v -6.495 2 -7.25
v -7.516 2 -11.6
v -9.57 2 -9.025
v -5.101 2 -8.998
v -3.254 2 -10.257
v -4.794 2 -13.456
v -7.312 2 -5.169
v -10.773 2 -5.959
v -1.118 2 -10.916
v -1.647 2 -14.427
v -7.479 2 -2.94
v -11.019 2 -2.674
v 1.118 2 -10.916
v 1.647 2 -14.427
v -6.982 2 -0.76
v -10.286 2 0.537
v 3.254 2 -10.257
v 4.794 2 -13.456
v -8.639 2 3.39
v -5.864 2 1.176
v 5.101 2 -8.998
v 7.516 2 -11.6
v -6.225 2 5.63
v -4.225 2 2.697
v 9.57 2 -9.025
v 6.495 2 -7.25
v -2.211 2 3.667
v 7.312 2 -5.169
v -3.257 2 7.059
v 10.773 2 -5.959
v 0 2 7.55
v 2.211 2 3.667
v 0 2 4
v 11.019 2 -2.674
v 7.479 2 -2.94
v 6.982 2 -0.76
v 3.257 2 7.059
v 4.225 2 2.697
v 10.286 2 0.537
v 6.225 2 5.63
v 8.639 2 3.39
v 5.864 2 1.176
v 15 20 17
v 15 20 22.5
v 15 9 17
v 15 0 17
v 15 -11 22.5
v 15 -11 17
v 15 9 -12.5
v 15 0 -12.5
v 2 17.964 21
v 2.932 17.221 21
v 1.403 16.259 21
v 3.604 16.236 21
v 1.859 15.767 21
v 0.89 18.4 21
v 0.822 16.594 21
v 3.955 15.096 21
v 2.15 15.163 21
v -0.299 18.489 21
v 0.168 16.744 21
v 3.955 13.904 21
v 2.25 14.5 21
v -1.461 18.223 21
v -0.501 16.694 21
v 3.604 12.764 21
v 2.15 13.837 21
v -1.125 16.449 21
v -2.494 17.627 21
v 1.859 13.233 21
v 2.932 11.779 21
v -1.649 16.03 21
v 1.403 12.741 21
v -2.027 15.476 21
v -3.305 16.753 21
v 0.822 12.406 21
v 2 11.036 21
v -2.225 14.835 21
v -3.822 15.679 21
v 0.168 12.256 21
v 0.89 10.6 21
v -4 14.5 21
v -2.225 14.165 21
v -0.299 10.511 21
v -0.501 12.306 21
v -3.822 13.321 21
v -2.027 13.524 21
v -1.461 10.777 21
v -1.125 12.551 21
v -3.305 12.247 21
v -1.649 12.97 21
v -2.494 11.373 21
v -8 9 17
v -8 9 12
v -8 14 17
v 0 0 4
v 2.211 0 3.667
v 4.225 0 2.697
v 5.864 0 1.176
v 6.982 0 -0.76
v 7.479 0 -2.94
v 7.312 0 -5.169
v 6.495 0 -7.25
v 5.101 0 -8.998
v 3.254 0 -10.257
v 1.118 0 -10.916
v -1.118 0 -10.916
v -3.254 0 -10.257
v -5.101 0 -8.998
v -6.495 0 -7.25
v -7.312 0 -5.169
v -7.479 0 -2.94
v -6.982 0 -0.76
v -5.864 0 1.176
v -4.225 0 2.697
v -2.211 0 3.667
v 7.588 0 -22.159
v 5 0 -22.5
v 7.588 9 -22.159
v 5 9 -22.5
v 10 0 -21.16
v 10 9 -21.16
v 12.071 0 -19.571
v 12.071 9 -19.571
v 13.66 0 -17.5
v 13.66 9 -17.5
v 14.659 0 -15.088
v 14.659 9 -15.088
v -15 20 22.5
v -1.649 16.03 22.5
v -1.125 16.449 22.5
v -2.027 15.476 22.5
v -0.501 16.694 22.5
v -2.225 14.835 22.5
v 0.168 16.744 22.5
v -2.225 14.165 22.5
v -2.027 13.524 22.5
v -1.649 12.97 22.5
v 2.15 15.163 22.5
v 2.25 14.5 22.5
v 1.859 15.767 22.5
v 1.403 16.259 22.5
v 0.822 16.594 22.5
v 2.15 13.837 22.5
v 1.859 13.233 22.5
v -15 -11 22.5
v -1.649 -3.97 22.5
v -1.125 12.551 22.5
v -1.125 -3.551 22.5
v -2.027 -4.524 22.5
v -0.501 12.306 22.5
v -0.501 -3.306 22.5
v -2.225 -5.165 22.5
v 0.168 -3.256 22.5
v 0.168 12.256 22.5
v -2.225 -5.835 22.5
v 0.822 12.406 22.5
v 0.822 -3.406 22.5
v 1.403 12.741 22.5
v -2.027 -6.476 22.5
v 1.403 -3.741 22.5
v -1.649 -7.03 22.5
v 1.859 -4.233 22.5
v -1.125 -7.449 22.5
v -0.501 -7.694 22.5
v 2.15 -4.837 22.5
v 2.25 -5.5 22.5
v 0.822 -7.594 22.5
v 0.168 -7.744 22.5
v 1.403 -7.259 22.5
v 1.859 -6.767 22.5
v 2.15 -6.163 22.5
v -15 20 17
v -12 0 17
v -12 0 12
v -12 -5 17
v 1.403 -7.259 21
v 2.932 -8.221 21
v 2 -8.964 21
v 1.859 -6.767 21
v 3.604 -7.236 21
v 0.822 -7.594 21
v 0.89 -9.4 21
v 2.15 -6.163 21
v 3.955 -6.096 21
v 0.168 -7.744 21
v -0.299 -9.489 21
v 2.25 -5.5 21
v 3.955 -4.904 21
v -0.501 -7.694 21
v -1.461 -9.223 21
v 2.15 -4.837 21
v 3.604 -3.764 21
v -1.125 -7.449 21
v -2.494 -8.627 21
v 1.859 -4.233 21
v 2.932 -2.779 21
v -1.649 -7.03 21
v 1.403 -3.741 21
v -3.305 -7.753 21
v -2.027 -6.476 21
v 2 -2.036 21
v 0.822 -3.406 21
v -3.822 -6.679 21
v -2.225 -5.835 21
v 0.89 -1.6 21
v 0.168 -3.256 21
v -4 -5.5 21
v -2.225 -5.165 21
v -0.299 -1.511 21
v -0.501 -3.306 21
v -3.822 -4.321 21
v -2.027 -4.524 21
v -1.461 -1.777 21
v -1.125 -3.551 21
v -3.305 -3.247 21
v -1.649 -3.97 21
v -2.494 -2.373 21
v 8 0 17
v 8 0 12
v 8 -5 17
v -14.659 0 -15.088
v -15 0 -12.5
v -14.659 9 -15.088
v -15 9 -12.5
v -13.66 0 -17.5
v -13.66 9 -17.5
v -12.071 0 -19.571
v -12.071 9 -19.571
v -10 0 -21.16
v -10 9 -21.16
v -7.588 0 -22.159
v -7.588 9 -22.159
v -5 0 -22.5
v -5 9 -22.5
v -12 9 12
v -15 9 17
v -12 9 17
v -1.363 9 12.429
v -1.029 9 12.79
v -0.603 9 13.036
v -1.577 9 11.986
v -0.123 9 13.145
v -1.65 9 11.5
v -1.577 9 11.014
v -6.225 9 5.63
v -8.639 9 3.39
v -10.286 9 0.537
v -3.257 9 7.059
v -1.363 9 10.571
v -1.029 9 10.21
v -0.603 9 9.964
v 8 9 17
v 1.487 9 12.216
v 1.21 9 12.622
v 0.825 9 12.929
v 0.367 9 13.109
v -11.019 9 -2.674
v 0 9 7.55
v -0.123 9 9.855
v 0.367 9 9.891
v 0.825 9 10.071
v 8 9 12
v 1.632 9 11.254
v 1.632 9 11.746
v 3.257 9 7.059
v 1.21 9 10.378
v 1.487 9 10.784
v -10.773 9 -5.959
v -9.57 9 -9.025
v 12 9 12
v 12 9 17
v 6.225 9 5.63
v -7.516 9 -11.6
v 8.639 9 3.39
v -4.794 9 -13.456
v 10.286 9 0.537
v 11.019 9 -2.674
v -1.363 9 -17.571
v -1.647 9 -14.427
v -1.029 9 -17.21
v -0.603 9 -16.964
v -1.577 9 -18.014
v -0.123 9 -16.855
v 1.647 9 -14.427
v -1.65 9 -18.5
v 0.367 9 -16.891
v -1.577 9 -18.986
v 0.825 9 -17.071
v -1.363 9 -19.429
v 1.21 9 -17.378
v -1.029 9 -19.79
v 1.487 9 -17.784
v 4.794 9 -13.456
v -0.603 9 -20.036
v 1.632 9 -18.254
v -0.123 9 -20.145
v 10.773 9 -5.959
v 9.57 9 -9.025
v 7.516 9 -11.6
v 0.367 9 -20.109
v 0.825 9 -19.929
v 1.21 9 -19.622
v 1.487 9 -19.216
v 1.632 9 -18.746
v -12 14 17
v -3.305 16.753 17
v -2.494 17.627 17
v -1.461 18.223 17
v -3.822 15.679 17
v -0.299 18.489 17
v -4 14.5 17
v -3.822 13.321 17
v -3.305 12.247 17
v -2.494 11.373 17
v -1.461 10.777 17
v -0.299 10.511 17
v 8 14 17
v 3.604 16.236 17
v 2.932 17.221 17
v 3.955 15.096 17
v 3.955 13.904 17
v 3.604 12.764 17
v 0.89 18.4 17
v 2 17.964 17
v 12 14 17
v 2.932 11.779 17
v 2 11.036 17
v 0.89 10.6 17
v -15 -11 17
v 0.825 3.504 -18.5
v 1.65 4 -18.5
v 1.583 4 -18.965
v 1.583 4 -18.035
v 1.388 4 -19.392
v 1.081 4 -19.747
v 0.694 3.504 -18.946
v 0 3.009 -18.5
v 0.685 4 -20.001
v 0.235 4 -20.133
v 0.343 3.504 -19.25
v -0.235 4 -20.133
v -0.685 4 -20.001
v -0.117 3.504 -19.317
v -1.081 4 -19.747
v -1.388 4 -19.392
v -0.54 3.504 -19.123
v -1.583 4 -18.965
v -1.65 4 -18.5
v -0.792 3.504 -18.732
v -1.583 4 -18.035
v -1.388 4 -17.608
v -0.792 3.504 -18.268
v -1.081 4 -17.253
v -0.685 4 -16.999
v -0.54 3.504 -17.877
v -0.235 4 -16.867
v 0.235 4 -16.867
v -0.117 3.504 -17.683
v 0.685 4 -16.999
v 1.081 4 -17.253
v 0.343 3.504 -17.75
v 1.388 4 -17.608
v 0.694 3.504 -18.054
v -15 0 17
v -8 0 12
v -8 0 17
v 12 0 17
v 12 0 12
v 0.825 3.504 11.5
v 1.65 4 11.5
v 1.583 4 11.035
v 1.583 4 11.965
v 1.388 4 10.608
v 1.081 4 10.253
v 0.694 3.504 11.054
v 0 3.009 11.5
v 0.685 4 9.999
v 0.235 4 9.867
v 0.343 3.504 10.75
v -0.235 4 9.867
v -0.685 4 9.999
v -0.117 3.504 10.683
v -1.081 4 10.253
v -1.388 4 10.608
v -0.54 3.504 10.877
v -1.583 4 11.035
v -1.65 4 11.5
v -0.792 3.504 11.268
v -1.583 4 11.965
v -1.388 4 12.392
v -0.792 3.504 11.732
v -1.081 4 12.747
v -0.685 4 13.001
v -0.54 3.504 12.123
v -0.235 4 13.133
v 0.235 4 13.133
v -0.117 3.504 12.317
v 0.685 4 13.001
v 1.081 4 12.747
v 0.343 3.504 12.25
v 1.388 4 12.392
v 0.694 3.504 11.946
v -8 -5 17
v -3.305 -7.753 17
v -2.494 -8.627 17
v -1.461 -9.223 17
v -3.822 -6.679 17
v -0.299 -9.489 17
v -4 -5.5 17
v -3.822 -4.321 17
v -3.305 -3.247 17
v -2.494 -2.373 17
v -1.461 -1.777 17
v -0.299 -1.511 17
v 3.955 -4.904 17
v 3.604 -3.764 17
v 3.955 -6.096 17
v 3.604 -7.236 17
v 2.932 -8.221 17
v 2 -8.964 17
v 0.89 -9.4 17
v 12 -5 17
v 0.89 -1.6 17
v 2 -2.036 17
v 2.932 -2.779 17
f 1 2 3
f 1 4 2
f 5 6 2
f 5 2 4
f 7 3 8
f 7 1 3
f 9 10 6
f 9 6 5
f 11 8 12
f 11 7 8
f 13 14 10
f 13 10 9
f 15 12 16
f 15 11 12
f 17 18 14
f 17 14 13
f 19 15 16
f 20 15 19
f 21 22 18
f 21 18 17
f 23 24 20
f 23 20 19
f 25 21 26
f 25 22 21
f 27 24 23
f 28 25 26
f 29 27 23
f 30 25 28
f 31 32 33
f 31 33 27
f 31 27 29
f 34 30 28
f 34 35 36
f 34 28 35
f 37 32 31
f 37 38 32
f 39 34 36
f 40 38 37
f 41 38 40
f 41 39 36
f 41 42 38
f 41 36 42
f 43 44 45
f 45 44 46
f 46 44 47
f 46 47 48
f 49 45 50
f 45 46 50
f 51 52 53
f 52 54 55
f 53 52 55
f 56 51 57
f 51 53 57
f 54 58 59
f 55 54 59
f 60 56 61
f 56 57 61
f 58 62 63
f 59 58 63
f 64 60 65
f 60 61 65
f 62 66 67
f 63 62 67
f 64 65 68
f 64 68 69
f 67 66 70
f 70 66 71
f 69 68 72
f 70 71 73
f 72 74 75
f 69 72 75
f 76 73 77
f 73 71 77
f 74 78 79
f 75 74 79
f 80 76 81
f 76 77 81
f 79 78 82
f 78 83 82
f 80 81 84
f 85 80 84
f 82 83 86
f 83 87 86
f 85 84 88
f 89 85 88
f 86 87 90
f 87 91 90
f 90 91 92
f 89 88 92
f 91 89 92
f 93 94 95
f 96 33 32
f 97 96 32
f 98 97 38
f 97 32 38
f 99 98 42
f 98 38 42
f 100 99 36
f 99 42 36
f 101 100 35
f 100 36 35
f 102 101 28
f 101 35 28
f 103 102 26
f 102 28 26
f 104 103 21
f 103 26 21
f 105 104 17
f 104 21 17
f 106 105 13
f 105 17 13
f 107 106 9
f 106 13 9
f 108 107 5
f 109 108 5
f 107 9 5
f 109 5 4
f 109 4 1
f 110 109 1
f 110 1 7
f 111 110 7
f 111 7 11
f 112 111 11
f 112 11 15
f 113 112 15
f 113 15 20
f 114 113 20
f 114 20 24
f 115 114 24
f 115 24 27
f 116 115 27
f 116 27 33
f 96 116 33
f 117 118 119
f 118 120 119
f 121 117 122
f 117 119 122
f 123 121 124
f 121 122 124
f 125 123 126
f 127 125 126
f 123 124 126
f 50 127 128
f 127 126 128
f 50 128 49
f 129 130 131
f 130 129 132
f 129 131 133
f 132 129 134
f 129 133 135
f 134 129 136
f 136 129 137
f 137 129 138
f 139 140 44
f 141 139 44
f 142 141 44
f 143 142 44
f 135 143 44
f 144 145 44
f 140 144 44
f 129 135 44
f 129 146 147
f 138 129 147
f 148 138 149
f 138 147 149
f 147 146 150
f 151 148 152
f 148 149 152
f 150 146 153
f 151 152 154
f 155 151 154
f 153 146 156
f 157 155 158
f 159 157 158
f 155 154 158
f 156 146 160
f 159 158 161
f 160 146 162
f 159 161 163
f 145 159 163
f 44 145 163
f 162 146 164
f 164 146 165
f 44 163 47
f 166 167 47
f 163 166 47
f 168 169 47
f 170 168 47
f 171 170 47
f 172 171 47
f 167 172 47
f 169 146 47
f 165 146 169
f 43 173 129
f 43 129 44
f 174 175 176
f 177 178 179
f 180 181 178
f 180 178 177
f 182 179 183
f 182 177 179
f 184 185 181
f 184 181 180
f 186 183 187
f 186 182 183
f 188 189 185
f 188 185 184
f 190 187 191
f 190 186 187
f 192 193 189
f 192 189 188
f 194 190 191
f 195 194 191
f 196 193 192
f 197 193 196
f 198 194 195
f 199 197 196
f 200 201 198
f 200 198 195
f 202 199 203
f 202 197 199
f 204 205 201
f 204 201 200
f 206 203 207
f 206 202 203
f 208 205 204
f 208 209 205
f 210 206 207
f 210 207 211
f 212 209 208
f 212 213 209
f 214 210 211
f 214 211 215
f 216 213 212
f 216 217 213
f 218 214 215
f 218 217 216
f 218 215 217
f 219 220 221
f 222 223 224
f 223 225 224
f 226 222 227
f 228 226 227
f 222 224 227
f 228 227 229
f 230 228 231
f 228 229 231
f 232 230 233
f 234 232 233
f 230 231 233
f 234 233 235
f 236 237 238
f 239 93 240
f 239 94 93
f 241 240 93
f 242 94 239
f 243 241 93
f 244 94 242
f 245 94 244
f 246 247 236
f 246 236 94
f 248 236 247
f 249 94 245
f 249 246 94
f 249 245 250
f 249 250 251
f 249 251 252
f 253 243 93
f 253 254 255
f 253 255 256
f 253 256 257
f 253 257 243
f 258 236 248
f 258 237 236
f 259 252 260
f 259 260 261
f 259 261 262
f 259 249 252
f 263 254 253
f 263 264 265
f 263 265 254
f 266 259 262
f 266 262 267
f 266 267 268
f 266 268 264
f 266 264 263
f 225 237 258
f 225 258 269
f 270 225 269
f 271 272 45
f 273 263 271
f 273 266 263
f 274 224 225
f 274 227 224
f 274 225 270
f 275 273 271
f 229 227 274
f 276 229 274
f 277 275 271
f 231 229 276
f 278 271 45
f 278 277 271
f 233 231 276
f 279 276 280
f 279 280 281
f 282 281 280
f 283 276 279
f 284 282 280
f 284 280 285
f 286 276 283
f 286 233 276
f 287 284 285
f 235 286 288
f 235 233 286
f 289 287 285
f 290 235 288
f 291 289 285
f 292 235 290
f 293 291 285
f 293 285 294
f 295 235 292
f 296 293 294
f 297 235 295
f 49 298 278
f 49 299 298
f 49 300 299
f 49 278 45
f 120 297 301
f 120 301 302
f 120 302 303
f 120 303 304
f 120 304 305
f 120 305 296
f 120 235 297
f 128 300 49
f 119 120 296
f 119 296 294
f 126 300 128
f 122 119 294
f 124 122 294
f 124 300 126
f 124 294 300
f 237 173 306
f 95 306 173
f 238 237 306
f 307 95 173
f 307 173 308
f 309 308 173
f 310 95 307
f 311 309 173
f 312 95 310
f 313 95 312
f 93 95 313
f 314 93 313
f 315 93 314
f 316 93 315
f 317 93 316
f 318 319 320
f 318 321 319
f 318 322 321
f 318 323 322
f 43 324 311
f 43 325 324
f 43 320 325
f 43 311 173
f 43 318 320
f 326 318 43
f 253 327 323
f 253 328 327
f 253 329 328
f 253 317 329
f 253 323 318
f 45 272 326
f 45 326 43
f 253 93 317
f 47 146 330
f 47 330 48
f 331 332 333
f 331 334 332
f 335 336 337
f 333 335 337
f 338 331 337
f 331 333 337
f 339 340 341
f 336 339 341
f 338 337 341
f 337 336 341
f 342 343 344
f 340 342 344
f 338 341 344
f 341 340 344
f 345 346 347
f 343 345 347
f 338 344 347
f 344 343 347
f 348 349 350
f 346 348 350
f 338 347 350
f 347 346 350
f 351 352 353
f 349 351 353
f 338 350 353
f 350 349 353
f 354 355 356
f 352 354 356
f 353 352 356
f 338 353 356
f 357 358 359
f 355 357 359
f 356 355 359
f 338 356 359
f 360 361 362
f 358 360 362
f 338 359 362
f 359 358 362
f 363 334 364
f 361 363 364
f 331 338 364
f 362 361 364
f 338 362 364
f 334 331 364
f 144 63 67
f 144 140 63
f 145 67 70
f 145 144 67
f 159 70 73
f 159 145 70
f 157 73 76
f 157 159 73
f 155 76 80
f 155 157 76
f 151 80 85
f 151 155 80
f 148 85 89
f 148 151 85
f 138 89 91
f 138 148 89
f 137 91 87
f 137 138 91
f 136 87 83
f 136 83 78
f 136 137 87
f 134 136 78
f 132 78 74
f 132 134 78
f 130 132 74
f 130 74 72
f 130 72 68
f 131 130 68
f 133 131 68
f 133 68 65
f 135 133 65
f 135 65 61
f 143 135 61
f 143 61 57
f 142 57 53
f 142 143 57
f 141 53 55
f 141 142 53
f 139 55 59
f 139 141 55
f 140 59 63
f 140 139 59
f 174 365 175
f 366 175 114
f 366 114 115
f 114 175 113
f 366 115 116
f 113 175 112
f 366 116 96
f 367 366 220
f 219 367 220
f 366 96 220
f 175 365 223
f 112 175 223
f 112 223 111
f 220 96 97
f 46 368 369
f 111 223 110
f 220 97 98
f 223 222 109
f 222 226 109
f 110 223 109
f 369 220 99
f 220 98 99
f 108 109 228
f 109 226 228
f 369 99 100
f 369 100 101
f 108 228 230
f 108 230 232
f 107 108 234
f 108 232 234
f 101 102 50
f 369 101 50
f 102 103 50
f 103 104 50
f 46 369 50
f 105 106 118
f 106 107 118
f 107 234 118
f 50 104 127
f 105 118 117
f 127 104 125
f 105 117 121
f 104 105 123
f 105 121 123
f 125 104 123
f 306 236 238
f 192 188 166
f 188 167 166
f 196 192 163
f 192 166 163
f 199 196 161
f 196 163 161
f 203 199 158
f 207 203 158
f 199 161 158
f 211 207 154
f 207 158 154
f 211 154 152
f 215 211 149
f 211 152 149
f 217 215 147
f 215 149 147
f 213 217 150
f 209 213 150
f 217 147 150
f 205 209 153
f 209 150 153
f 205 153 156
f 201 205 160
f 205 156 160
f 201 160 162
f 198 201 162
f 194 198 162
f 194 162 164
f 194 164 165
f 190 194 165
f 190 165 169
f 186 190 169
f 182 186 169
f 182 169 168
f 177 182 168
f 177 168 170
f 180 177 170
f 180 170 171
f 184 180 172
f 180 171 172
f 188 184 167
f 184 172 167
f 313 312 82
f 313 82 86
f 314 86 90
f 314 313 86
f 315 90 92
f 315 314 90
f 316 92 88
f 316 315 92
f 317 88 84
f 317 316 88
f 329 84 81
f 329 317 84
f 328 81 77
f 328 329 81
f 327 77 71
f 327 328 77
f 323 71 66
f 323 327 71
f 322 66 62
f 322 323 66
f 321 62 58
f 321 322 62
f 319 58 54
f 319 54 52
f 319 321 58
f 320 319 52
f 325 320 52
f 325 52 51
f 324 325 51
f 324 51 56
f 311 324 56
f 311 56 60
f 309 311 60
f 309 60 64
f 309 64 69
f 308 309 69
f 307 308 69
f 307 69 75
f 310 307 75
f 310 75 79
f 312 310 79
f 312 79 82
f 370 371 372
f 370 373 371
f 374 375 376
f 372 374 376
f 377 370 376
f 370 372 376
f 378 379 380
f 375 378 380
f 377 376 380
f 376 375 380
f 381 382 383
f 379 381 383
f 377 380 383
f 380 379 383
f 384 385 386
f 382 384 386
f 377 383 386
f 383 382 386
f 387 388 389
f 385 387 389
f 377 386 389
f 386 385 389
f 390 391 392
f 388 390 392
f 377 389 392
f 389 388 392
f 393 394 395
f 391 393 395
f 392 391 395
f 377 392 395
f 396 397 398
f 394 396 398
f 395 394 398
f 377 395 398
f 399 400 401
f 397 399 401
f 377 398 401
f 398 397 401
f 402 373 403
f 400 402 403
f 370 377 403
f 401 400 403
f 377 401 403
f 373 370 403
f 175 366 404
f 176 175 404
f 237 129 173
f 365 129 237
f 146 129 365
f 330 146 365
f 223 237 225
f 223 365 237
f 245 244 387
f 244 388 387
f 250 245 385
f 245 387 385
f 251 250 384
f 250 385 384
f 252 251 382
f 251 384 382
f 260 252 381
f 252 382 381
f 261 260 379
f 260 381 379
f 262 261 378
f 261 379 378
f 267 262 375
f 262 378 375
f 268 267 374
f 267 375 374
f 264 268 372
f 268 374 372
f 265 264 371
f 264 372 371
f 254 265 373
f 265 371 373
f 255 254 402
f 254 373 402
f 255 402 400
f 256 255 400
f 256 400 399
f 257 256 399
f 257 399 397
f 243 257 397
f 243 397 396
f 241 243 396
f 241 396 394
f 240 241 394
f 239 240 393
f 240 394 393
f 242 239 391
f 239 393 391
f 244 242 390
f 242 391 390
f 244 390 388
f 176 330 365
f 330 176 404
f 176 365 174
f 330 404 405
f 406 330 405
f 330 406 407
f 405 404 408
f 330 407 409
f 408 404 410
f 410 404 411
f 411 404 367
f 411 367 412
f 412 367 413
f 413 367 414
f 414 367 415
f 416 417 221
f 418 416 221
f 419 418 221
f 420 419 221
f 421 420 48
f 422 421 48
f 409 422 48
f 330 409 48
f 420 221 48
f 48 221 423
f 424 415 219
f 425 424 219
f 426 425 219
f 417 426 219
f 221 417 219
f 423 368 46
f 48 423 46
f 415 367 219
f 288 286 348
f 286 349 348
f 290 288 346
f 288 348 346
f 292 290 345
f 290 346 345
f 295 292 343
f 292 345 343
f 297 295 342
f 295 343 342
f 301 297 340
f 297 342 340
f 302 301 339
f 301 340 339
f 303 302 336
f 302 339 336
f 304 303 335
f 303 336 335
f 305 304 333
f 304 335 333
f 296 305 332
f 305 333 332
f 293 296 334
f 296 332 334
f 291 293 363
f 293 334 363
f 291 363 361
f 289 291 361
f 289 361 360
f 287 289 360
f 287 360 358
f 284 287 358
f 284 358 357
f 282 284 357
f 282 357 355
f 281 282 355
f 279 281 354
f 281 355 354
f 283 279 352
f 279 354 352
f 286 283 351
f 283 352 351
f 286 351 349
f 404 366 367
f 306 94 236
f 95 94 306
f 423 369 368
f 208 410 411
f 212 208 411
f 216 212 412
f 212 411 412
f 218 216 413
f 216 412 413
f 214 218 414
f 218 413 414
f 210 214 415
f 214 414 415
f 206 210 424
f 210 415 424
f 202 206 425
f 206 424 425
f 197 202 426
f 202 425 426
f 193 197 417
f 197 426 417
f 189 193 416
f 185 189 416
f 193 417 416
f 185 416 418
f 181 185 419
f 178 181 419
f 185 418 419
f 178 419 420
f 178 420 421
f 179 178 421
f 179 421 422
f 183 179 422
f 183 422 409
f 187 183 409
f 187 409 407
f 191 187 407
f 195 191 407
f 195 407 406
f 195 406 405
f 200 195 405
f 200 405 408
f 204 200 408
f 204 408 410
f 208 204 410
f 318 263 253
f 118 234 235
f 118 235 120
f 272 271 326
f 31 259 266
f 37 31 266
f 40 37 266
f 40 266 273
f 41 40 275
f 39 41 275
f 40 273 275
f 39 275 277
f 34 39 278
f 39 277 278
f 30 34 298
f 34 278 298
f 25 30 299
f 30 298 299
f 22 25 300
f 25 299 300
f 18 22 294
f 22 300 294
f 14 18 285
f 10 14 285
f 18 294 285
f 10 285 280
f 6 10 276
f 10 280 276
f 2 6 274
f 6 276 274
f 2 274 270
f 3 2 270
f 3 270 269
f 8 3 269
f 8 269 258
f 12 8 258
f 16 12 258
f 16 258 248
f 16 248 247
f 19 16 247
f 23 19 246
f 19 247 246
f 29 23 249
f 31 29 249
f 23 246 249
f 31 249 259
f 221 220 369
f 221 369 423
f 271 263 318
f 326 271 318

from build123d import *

# Parameters (mm, degrees)
SKETCH2_W                      = 30
SKETCH2_H                      = 45
BOSS_EXTRUDE1_DEPTH            = 9
SKETCH3_R                      = 11.05
CUT_EXTRUDE1_DEPTH             = 7
SKETCH4_R                      = 7.5
CUT_EXTRUDE2_DEPTH             = 28.932955447
FILLET1_R                      = 10
SKETCH5_W                      = 30
SKETCH5_H                      = 11
BOSS_EXTRUDE2_DEPTH            = 5.5
CBORE_FOR_M4_SHCS1_D           = 4.5
CBORE_FOR_M4_SHCS1_CBORE_D     = 8
CBORE_FOR_M4_SHCS1_CBORE_DEPTH = 4
RIB1_REACH                     = 37.387
SKETCH10_WALL_W                = 79.845356928
SKETCH10_WALL_H                = 4
F_3_3_3_3_DIAMETER_HOLE1_D     = 3.3
F_3_3_3_3_DIAMETER_HOLE1_DEPTH = 5
F_3_3_3_3_DIAMETER_HOLE1_TIP   = 0.991420021
SKETCH14_W                     = 30
SKETCH14_H                     = 5.5
BOSS_EXTRUDE3_DEPTH            = 11
MIRROR2_COPY_1_REACH           = 37.387
MIRROR2_COPY_1_SKETCH_W        = 79.845356928
MIRROR2_COPY_1_SKETCH_H        = 4


with BuildPart() as part:
    # Sketch2 → Boss-Extrude1 (new body)
    with BuildSketch(Plane(origin=(0, 0, 0), x_dir=(1, 0, 0), z_dir=(0, 1, 0))):
        Rectangle(SKETCH2_W, SKETCH2_H)
    extrude(amount=BOSS_EXTRUDE1_DEPTH)

    # Sketch3 → Cut-Extrude1 (cut)
    with BuildSketch(Plane(origin=(0, 9, 0), x_dir=(1, 0, 0), z_dir=(0, 1, 0))):
        with Locations(Location((0, 3.5, 0), (0, 0, 270))):
            Circle(SKETCH3_R)
    extrude(amount=-CUT_EXTRUDE1_DEPTH, mode=Mode.SUBTRACT)

    # Sketch4 → Cut-Extrude2 (cut, through all)
    with BuildSketch(Plane(origin=(0, 2, 0), x_dir=(1, 0, 0), z_dir=(0, 1, 0))):
        with Locations(Location((0, 3.5, 0), (0, 0, 270))):
            Circle(SKETCH4_R)
    extrude(amount=-CUT_EXTRUDE2_DEPTH, mode=Mode.SUBTRACT)

    # Fillet1
    fillet1_edges = [part.edges().sort_by_distance(p)[0] for p in [
        (-15, 4.5, -22.5),
        (15, 4.5, -22.5),
    ]]
    fillet(fillet1_edges, radius=FILLET1_R)

    # Sketch5 → Boss-Extrude2 (add)
    with BuildSketch(Plane.XY.offset(22.5)):
        with Locations((0, -5.5)):
            Rectangle(SKETCH5_W, SKETCH5_H)
    extrude(amount=-BOSS_EXTRUDE2_DEPTH)

    # CBORE for M4 SHCS1 (through all)
    with Locations(Plane(origin=(0, 0, 17), x_dir=(-1, 0, 0), z_dir=(0, 0, -1))):
        with Locations((0, -5.5)):
            cbore_for_m4_shcs1 = CounterBoreHole(CBORE_FOR_M4_SHCS1_D / 2, CBORE_FOR_M4_SHCS1_CBORE_D / 2, CBORE_FOR_M4_SHCS1_CBORE_DEPTH)

    # Sketch10 wall → Rib1 (add, up to next)
    with BuildSketch(Plane(origin=(-10, -2.5, 14.5), x_dir=(0, -0.707106781187, 0.707106781187), z_dir=(0, 0.707106781187, 0.707106781187)), mode=Mode.PRIVATE) as rib1_sk1:
        Rectangle(SKETCH10_WALL_W, SKETCH10_WALL_H)
    rib1_tool1 = extrude(rib1_sk1.sketch, amount=RIB1_REACH, mode=Mode.PRIVATE) - part.part
    rib1 = rib1_tool1.solids().sort_by_distance((-10, -2.5, 14.5))[0]
    add(rib1)

    # Mirror1: Rib1 across plane
    add(rib1.mirror(Plane(origin=(0, 0, 0), x_dir=(0, 0, 1), z_dir=(1, 0, 0))))

    # Ø3.3 (3.3) Diameter Hole1
    with Locations(Plane(origin=(0, 9, 0), x_dir=(1, 0, 0), z_dir=(0, 1, 0))):
        with Locations((0, -11.5), (0, 3.5), (0, 18.5)):
            Hole(F_3_3_3_3_DIAMETER_HOLE1_D / 2, depth=F_3_3_3_3_DIAMETER_HOLE1_DEPTH)
            with Locations((0, 0, -(F_3_3_3_3_DIAMETER_HOLE1_DEPTH + F_3_3_3_3_DIAMETER_HOLE1_TIP / 2))):  # 118° drill point
                Cone(0, F_3_3_3_3_DIAMETER_HOLE1_D / 2, F_3_3_3_3_DIAMETER_HOLE1_TIP, mode=Mode.SUBTRACT)

    # Sketch14 → Boss-Extrude3 (add)
    with BuildSketch(Plane(origin=(0, 9, 0), x_dir=(1, 0, 0), z_dir=(0, 1, 0))):
        with Locations((0, -19.75)):
            Rectangle(SKETCH14_W, SKETCH14_H)
    extrude(amount=BOSS_EXTRUDE3_DEPTH)

    # Mirror2: Rib1 across plane
    add(rib1.mirror(Plane(origin=(0, 4.5, 0), x_dir=(0, 0, 1), z_dir=(0, -1, 0))))

    # Mirror2 copy 1 sketch → Mirror2 copy 1 (add, up to next)
    with BuildSketch(Plane(origin=(10, 11.5, 14.5), x_dir=(0, 0.707106781187, 0.707106781187), z_dir=(0, -0.707106781187, 0.707106781187)), mode=Mode.PRIVATE) as mirror2_copy_1_sk1:
        Rectangle(MIRROR2_COPY_1_SKETCH_W, MIRROR2_COPY_1_SKETCH_H)
    mirror2_copy_1_tool1 = extrude(mirror2_copy_1_sk1.sketch, amount=MIRROR2_COPY_1_REACH, mode=Mode.PRIVATE) - part.part
    add(mirror2_copy_1_tool1.solids().sort_by_distance((10, 11.5, 14.5))[0])

    # Mirror3: CBORE for M4 SHCS1 across plane
    add(cbore_for_m4_shcs1.mirror(Plane(origin=(0, 4.5, 0), x_dir=(0, 0, 1), z_dir=(0, -1, 0))), mode=Mode.SUBTRACT)


solid = part.part
